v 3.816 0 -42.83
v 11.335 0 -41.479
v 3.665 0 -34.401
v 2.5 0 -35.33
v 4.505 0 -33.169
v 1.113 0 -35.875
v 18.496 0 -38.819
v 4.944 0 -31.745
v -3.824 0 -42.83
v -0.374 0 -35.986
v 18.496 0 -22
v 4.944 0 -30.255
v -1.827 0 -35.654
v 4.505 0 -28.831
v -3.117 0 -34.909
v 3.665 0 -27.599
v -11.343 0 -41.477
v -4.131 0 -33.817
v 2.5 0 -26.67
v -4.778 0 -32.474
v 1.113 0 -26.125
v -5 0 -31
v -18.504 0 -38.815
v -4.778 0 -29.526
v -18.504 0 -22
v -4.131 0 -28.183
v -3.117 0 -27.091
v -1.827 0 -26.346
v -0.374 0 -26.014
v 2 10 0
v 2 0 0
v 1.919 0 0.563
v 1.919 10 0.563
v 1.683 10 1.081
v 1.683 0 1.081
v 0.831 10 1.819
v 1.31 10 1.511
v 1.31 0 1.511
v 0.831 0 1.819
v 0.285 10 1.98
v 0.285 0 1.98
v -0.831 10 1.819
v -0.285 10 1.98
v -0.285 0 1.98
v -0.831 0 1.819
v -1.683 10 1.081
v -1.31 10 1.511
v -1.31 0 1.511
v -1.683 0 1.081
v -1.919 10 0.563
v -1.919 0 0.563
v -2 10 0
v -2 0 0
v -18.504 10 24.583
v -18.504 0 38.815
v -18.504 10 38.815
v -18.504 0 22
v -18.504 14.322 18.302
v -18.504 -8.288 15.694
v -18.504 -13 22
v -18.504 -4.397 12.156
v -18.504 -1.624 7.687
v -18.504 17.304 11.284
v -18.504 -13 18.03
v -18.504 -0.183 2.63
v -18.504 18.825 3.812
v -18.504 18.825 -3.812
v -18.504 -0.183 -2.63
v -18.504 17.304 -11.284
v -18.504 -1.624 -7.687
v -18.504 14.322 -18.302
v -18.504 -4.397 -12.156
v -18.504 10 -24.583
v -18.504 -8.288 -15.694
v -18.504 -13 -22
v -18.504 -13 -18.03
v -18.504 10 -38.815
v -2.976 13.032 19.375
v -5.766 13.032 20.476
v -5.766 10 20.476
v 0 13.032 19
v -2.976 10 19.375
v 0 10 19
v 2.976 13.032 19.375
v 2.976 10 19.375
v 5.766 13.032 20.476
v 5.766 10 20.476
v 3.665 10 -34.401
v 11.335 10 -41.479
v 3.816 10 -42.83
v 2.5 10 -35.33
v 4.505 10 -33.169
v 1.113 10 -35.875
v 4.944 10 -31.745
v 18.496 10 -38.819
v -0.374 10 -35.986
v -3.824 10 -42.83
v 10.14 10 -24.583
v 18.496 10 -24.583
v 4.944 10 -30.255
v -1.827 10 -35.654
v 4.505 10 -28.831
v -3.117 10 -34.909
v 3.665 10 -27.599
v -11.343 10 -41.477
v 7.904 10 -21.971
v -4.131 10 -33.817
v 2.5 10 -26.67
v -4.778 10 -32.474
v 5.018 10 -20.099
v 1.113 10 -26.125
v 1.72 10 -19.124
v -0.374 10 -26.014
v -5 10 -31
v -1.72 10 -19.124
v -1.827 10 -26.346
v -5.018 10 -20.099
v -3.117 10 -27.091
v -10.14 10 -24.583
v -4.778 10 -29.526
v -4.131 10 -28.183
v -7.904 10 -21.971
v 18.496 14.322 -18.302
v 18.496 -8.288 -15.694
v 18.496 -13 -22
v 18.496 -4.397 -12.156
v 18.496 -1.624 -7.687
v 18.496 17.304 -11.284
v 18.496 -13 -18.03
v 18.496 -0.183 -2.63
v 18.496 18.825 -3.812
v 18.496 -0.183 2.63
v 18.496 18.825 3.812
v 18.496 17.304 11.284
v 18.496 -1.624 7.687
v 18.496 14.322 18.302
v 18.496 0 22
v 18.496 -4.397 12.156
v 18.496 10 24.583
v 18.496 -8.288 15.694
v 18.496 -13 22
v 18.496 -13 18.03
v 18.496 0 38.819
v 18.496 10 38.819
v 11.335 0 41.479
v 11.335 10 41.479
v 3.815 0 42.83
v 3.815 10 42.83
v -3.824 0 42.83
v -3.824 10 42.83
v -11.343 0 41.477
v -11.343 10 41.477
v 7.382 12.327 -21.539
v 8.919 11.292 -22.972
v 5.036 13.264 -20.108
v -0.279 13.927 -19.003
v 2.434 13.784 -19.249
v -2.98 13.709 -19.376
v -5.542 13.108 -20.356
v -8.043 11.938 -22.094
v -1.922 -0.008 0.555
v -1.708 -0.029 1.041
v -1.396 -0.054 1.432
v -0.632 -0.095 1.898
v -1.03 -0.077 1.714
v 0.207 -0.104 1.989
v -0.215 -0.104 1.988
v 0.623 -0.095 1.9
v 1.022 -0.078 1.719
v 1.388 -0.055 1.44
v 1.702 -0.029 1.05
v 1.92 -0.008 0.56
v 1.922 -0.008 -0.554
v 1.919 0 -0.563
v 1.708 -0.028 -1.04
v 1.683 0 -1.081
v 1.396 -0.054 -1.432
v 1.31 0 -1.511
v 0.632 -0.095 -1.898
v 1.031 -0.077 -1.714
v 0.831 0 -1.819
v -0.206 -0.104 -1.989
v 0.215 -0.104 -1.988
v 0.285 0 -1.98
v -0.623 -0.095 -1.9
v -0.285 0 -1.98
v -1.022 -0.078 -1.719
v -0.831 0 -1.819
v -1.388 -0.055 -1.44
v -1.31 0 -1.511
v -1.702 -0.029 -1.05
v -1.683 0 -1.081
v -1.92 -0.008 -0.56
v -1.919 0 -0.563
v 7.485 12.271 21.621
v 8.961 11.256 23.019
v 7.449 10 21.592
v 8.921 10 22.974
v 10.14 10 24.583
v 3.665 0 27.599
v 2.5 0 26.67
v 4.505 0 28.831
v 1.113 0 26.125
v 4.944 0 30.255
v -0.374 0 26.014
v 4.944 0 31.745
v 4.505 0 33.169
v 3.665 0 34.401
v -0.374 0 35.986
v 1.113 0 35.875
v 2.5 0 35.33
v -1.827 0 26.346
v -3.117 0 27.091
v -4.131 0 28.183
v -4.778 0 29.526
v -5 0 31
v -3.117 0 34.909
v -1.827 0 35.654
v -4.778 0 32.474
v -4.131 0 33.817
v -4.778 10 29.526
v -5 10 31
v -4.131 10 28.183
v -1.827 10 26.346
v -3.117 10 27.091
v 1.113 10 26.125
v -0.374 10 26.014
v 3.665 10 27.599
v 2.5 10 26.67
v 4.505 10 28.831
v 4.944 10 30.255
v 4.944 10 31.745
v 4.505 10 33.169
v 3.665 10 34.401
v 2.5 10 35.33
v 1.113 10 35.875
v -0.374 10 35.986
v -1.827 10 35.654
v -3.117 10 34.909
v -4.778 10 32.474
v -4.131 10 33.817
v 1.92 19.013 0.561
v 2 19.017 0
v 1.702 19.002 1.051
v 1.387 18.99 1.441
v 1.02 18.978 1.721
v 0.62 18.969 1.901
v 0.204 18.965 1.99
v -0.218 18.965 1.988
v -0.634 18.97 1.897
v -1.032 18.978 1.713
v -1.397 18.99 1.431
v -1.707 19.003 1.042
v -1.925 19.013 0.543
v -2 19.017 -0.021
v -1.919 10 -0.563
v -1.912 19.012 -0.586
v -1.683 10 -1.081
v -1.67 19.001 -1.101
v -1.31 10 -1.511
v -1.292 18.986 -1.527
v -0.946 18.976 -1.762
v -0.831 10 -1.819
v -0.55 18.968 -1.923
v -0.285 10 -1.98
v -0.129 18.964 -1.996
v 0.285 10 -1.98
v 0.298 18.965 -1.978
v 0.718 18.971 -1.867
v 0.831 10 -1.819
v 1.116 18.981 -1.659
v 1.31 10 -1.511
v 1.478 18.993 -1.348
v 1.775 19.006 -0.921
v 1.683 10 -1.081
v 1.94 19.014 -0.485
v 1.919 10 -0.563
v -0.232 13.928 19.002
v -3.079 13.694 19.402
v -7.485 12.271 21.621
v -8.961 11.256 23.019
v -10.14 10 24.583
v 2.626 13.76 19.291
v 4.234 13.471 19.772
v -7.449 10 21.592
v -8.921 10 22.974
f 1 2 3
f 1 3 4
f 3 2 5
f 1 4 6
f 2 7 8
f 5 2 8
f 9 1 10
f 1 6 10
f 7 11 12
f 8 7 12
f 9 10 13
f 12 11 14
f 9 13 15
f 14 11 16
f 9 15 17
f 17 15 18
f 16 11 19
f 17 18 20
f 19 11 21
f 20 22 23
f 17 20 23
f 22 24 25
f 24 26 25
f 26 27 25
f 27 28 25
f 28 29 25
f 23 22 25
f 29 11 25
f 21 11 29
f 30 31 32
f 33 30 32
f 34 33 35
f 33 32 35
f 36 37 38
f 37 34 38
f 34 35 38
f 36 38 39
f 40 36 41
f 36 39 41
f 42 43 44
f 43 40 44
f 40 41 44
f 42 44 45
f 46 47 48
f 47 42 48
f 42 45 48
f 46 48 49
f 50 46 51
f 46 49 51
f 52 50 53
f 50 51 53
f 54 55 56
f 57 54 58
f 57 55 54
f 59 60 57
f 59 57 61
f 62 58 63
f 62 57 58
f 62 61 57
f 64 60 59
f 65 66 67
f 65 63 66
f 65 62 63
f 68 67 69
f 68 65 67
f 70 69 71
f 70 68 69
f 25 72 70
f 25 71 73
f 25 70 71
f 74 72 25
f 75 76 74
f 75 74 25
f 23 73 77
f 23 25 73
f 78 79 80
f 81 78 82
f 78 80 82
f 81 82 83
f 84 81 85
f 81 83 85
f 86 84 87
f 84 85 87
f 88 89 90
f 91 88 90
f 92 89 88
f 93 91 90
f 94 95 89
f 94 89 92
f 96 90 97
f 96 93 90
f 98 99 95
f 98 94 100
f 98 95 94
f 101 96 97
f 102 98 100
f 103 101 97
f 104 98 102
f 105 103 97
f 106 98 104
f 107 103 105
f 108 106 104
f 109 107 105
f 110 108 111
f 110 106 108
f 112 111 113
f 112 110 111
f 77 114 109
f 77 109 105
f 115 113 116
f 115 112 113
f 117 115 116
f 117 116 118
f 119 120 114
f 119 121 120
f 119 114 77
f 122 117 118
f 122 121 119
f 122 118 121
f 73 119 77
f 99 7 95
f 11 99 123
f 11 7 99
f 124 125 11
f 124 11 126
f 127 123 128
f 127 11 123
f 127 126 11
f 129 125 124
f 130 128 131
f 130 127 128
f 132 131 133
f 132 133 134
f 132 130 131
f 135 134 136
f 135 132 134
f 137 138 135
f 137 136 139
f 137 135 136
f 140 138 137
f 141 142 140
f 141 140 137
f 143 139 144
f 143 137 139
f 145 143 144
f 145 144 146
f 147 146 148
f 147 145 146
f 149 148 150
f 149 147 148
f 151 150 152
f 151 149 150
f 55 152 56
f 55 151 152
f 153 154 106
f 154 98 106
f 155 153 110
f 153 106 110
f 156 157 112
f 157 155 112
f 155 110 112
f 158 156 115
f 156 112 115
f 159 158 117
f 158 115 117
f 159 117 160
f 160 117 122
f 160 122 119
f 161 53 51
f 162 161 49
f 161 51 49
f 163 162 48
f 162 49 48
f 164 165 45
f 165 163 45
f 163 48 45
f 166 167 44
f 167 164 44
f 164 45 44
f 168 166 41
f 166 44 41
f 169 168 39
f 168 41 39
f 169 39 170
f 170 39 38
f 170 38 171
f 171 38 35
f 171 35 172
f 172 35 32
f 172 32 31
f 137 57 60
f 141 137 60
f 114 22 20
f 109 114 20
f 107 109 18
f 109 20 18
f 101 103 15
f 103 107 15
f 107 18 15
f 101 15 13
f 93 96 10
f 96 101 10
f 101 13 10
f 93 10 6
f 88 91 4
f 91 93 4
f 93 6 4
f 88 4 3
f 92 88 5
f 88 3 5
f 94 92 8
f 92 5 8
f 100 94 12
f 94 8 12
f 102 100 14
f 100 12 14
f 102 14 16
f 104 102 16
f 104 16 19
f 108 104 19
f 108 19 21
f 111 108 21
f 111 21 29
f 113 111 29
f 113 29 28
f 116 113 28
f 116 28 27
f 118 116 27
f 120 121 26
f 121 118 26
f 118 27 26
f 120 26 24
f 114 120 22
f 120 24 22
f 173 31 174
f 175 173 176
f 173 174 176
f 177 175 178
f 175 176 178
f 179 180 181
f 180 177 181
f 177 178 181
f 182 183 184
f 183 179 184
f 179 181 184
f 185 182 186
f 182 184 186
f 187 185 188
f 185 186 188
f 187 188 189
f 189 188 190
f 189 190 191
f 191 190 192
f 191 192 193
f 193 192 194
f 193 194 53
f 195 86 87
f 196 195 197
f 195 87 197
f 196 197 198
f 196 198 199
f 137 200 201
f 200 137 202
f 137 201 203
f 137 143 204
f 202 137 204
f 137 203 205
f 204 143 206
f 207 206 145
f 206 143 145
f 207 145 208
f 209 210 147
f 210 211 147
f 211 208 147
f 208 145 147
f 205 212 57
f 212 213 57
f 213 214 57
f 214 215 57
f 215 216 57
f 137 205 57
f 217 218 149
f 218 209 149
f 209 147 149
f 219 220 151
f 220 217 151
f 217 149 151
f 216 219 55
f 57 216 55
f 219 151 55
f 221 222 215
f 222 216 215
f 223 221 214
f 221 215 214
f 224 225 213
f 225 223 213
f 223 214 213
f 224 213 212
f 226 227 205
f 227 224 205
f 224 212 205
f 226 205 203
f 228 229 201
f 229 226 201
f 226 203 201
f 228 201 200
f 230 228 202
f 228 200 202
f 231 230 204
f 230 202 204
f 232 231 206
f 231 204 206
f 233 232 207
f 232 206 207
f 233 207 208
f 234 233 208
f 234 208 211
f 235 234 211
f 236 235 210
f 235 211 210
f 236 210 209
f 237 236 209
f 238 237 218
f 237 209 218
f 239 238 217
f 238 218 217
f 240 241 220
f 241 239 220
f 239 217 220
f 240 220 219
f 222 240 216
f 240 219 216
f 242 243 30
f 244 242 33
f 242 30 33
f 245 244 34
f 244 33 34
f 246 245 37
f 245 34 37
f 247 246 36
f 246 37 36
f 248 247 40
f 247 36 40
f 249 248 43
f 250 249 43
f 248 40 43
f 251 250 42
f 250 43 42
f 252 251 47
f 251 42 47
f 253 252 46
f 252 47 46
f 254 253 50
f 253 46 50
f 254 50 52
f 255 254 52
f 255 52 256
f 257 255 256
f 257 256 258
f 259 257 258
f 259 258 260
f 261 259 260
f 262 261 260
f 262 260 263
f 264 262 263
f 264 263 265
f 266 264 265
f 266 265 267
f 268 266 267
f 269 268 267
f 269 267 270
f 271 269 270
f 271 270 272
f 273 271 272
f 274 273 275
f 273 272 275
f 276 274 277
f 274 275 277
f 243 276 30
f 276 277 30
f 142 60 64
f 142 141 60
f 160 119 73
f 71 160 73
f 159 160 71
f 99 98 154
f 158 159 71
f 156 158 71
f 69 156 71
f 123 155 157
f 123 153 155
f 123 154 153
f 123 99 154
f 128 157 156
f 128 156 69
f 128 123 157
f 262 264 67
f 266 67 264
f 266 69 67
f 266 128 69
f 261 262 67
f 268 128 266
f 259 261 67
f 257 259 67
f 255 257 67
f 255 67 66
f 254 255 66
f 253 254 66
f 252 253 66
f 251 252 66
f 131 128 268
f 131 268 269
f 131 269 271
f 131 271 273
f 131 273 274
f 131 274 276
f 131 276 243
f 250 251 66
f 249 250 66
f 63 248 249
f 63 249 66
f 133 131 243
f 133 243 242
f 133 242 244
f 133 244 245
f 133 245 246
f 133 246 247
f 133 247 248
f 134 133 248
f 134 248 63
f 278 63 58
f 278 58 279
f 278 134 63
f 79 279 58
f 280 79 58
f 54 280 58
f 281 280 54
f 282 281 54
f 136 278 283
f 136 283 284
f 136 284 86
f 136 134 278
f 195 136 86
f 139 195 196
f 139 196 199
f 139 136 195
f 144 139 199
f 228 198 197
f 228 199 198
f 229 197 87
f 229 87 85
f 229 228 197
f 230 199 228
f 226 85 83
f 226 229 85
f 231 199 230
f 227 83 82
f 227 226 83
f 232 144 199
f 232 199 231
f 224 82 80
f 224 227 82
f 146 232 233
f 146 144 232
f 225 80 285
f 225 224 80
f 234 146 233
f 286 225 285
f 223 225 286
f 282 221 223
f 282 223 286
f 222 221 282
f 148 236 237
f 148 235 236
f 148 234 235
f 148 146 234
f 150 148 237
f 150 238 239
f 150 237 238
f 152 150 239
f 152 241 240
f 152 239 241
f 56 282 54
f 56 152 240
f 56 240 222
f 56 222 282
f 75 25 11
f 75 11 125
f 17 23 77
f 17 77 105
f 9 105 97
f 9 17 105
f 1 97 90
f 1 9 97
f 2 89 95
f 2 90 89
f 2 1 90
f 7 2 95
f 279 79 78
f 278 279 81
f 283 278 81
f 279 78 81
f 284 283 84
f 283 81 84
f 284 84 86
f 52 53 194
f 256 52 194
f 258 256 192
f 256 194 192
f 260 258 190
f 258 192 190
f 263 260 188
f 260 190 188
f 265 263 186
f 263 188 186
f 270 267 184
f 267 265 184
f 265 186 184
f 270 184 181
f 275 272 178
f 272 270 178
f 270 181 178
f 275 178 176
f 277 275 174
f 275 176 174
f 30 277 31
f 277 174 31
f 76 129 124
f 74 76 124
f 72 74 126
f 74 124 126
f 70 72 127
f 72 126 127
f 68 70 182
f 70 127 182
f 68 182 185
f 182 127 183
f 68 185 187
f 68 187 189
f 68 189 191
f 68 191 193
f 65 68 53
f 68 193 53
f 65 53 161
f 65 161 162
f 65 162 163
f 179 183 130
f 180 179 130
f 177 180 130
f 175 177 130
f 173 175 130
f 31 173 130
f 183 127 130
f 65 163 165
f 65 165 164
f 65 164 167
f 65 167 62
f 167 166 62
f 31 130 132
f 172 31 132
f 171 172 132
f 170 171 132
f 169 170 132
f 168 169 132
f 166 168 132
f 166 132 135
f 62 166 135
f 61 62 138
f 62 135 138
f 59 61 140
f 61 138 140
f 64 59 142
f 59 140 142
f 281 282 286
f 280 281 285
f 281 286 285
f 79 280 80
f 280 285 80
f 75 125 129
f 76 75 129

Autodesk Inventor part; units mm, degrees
ref_plane "YZ Plane" through (0, 0, 0) normal (1, 0, 0) x (0, 1, 0)
ref_plane "XZ Plane" through (0, 0, 0) normal (0, 1, 0) x (-1, 0, 0)
ref_plane "XY Plane" through (0, 0, 0) normal (0, 0, 1) x (1, 0, 0)
sketch "Sketch1" plane through (0, 0, 0) normal (0, 1, 0) x (-1, 0, 0)
  circle A0 centre (0, 0) radius 2
  line L0 (-18.4961, 38.8165) -> (-18.4961, -38.8135)
  line L1 (18.4961, 38.8135) -> (-18.4961, -38.8135) construction
  line L2 (-18.4961, 38.8165) -> (18.4961, -38.8165) construction
  circle A1 centre (0, 31) radius 5
  circle A2 centre (0, -31) radius 5
  arc A3 (18.5039, 38.815) -> (-18.4961, 38.8188) centre (0, 0) ccw
  arc A4 (-18.4961, -38.8188) -> (18.5039, -38.815) centre (0, 0) ccw
  line L3 (18.5039, 38.815) -> (18.5039, -38.815)
  line L4 (-18.4961, -38.8135) -> (-18.4961, -38.8188)
  line L5 (-18.4961, 38.8165) -> (-18.4961, 38.8188)
  dimension "d0" = 2
  dimension "d4" = 10
  dimension "d5" = 10
  dimension "d6" = 31
  dimension "d7" = 31
  dimension "d8" = 77.63
  dimension "d9" = 37
  dimension "d10" = 43
  dimension "d11" = 43
  dimension "d12" = 77.63
extrude "Extrusion1" add sketch "Sketch1" along normal blind 10
sketch "Sketch2" plane through (18.4961, 0, 38.8188) normal (1, 0, 0) x (0, 0, -1)
  line L0 (0, 0) -> (77.6375, 0) projected
  line L1 (0, 10) -> (77.6375, 10) projected
  line L2 (0.0038, 0) -> (-4.1812, 0) projected
  line L3 (-4.1812, 0) -> (16.8188, 0)
  line L4 (16.8188, 0) -> (16.8188, -13)
  line L5 (16.8188, -13) -> (20.7888, -13)
  line L6 (81.8188, 0) -> (77.6338, 0) projected
  line L7 (81.8188, 0) -> (60.8188, 0)
  line L8 (60.8188, 0) -> (60.8188, -13)
  line L9 (60.8188, -13) -> (56.8488, -13)
  arc A0 (56.8488, -13) -> (20.7888, -13) centre (38.8188, -19.0031) ccw
  arc A1 (63.4021, 10) -> (14.2354, 10) centre (38.8188, -19.0031) ccw
  line L10 (36.8188, 10) -> (40.8188, 10) projected
  point P0 (38.8188, 0)
  point P1 (38.8188, 19.0169)
  dimension "d15" = 21
  dimension "d16" = 13
  dimension "d17" = 3.97
  dimension "d18" = 21
  dimension "d19" = 13
  dimension "d20" = 3.97
  dimension "d22" = 38.02
extrude "Extrusion2" add sketch "Sketch2" against normal blind 37
sketch "Sketch3" plane through (0, 10, 0) normal (0, -1, 0) x (1, 0, 0)
  circle A0 centre (0, 0) radius 2 projected
extrude "Extrusion3" cut sketch "Sketch3" along normal through all both and the other way through all
sketch "Sketch4" plane through (0, 0, 0) normal (0, -1, 0) x (1, 0, 0)
  circle A0 centre (0, 31) radius 5 projected
  arc A1 (-12, 31) -> (12, 31) centre (0, 31) ccw
  circle A2 centre (0, 31) radius 10.5 projected
  arc A3 (-10.5, 31) -> (10.5, 31) centre (0, 31) ccw
  line L0 (12, 31) -> (-12, 31)
  point P0 (10.5, 31)
  dimension "d27" = 12
extrude "Extrusion4" cut sketch "Sketch4" against normal blind 3.032 from surface at -10 contours L0 A1 A2
sketch "Sketch5" plane through (0, 10, 0) normal (0, 1, 0) x (1, 0, 0)
  line L0 (-18.5039, 24.5833) -> (18.4961, 24.5833) projected
  circle A0 centre (0, 31) radius 5 projected
  circle A1 centre (0, 31) radius 10.5 projected
  arc A2 (-12, 31) -> (12, 31) centre (0, 31) ccw
  arc A3 (-10.5, 31) -> (10.5, 31) centre (0, 31) ccw
  line L1 (12, 31) -> (-12, 31)
  point P0 (8.3112, 24.5833)
  point P1 (-8.3112, 24.5833)
  dimension "d30" = 12
extrude "Extrusion5" cut sketch "Sketch5" along normal through all contours A2 L1 A1 L0 | L0 A1 A2 | L0 A1 | L0 A1 L1 A2
sketch "Sketch6" plane through (0, 13.032, 31) normal (0, -1, 0) x (1, 0, 0)
  arc A0 (-5.7661, -10.5239) -> (5.7661, -10.5239) centre (0, 0) ccw projected
  line L0 (-5.7661, -10.5239) -> (5.7661, -10.5239) projected
  spline S0 degree 6 poles (8.3112, -6.4167) (8.1303, -6.651) (7.9395, -6.8817) (7.739, -7.108) (7.5289, -7.3291) (7.3096, -7.5442) (6.6527, -8.1442) (6.1935, -8.5115) (5.7064, -8.85) (5.1948, -9.156) (4.663, -9.4266) (3.9079, -9.7483) (3.6976, -9.8316) (3.4851, -9.9094) (3.2708, -9.9817) (3.0547, -10.0484) (2.3754, -10.239) (1.9069, -10.3432) (1.4335, -10.4215) (0.9567, -10.4739) (0.4783, -10.5) (-0.4841, -10.5) (-0.9683, -10.4732) (-1.4508, -10.4196) (-1.9299, -10.3394) (-2.4038, -10.2327) (-3.0854, -10.0389) (-3.2986, -9.9724) (-3.5101, -9.9004) (-3.7198, -9.8231) (-3.9273, -9.7404) (-4.6765, -9.4197) (-5.2053, -9.1498) (-5.7139, -8.8448) (-6.1983, -8.5077) (-6.655, -8.1422) (-7.3097, -7.5441) (-7.529, -7.3291) (-7.739, -7.108) (-7.9396, -6.8817) (-8.1303, -6.6509) (-8.3112, -6.4167) knots 0 0 0 0 0 0 0 0.097765 0.097765 0.097765 0.097765 0.097765 0.281656 0.281656 0.281656 0.281656 0.281656 0.351588 0.351588 0.351588 0.351588 0.351588 0.499999 0.499999 0.499999 0.499999 0.499999 0.65021 0.65021 0.65021 0.65021 0.65021 0.719277 0.719277 0.719277 0.719277 0.719277 0.902242 0.902242 0.902242 0.902242 0.902242 1 1 1 1 1 1 1 projected
  line L1 (8.3112, -6.4167) -> (-8.3112, -6.4167) projected
  point P0 (0, -31)
extrude "Extrusion6" cut sketch "Sketch6" against normal blind 10 from surface at 3.032
properties part number "cap" material "Brass, Soft Yellow"
